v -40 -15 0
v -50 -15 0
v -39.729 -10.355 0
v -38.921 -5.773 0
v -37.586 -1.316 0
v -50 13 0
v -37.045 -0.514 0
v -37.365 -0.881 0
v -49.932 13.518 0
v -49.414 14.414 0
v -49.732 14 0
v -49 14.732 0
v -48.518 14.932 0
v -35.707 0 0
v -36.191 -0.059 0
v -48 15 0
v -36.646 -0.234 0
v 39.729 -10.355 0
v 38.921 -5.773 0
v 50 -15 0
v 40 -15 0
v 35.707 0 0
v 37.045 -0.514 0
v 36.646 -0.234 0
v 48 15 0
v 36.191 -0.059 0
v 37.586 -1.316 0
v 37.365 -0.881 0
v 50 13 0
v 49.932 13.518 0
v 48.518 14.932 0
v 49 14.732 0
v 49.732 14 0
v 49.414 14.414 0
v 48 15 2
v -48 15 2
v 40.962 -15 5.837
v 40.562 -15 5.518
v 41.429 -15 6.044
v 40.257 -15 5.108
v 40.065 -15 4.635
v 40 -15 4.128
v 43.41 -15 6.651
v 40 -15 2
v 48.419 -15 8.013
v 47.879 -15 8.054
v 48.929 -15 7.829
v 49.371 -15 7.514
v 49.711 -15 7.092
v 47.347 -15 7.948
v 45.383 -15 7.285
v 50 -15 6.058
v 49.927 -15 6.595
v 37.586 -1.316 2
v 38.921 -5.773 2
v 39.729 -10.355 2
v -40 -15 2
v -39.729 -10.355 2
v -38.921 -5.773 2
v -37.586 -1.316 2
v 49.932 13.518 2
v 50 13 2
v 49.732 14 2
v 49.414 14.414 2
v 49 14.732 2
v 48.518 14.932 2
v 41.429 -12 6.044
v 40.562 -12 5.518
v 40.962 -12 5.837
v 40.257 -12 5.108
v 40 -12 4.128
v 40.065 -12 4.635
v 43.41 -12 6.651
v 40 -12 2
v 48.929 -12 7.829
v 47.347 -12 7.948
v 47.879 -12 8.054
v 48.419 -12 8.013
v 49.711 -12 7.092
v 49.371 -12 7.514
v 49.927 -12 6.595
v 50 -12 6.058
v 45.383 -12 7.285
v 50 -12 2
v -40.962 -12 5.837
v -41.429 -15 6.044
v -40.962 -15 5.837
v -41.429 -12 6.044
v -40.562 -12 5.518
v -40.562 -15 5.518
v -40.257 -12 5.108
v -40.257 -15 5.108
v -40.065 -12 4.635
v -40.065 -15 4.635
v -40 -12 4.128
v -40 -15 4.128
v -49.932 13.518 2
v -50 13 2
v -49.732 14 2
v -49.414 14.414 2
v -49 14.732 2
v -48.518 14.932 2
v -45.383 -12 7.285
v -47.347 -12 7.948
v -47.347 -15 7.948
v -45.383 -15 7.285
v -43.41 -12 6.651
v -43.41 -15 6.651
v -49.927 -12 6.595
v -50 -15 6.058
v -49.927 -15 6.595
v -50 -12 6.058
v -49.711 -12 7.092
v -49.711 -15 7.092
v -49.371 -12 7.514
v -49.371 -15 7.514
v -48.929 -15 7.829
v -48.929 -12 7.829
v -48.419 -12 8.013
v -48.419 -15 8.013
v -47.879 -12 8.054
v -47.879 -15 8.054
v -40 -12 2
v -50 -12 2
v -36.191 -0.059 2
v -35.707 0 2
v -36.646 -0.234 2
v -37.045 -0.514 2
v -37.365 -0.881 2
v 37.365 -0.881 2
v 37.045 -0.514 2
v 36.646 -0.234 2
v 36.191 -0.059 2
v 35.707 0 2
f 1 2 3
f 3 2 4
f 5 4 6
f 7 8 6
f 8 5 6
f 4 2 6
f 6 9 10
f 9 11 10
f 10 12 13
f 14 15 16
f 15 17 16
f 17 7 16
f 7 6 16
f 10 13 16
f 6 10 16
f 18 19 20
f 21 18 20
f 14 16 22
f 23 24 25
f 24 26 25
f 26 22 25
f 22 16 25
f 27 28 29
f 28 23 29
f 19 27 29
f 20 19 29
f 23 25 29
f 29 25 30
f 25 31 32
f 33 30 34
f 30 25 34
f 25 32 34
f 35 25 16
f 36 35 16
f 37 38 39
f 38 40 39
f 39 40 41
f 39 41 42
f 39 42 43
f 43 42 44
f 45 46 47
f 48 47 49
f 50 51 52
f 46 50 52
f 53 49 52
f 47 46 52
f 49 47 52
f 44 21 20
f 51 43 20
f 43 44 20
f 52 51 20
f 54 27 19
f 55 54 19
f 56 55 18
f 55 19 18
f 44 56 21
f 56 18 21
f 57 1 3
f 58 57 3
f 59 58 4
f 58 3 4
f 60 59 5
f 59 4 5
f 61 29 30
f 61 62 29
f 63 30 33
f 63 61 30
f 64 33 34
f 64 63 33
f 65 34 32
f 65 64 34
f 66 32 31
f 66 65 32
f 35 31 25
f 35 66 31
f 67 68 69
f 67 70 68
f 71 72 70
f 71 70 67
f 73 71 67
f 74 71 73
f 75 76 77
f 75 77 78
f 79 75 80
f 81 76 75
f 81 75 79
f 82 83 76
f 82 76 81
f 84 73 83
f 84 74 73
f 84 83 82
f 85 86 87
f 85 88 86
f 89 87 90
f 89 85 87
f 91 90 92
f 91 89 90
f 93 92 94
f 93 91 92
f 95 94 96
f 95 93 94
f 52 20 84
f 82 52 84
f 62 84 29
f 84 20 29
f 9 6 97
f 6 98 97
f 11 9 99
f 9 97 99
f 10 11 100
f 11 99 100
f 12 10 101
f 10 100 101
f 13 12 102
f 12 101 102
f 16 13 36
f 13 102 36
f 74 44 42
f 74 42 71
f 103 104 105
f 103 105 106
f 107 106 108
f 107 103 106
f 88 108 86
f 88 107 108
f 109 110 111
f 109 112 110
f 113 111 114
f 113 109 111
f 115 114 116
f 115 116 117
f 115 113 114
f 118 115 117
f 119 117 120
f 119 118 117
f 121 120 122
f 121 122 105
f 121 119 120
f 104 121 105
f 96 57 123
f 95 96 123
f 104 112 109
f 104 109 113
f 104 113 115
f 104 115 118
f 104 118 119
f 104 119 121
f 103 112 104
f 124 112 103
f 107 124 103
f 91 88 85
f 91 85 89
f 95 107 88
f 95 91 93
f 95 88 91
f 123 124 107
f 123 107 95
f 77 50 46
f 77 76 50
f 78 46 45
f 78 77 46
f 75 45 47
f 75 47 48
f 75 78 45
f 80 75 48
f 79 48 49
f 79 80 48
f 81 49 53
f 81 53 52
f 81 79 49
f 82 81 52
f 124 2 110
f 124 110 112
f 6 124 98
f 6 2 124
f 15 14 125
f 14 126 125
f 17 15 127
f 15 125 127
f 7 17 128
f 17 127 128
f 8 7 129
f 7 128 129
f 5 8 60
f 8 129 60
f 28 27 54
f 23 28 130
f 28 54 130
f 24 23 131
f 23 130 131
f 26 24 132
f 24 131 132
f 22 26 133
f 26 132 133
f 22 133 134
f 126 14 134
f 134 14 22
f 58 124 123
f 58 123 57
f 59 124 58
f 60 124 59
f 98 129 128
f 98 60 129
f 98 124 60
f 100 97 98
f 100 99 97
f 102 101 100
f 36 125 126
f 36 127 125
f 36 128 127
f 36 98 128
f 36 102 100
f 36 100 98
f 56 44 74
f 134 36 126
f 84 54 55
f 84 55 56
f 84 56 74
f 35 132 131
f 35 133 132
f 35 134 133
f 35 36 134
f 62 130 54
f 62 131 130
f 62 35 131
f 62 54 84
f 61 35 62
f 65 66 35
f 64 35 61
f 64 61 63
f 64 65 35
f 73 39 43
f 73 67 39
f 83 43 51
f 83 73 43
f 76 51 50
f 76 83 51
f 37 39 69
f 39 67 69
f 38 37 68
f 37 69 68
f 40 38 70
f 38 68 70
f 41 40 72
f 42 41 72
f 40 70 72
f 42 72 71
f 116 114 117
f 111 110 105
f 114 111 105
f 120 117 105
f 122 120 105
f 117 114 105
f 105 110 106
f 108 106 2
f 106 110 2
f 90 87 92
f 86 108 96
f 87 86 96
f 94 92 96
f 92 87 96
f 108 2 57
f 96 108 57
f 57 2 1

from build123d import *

# Parameters (mm, degrees)
F1_DEPTH = 2
F2_W     = 10
F2_H     = 3
F3_DEPTH = 10
F4_R     = 145
F5_DEPTH = 25
F6_R     = 2


with BuildPart() as f1:
    # F0 (on Top) → F1 (new body)
    with BuildSketch(Plane.XY):
        with BuildLine():
            Line((50, 15), (-50, 15))
            Line((-50, 15), (-50, -15))
            Line((-50, -15), (-40, -15))
            ThreePointArc((-40, -15), (-39.2634671, -7.3593095017), (-37.0809924355, 0))
            Line((-37.0809924355, 0), (37.0809924355, 0))
            ThreePointArc((37.0809924355, 0), (39.2634671, -7.3593095017), (40, -15))
            Line((40, -15), (50, -15))
            Line((50, -15), (50, 15))
        make_face()
    extrude(amount=F1_DEPTH)

    # F2 (on face) → F3 (join)
    with BuildSketch(Plane.XY.offset(2)):
        with Locations((-45, -13.5)):
            Rectangle(F2_W, F2_H)
        with Locations((45, -13.5)):
            Rectangle(F2_W, F2_H)
    extrude(amount=F3_DEPTH)

    # F4 (on Front) → F5 (cut)
    with BuildSketch(Plane.XZ):
        with Locations((0, 145)):
            Circle(F4_R)
    extrude(amount=F5_DEPTH, mode=Mode.SUBTRACT)

    # F6
    f6_edges = [f1.edges().sort_by_distance(p)[0] for p in [
        (-50, -13.5, 8.893424),
        (50, -13.5, 8.893424),
        (-40, -13.5, 5.626401),
        (40, -13.5, 5.626401),
        (37.080992, 0, 1),
        (-37.080992, 0, 1),
        (-50, 15, 1),
        (50, 15, 1),
    ]]
    fillet(f6_edges, radius=F6_R)


solid = f1.part
